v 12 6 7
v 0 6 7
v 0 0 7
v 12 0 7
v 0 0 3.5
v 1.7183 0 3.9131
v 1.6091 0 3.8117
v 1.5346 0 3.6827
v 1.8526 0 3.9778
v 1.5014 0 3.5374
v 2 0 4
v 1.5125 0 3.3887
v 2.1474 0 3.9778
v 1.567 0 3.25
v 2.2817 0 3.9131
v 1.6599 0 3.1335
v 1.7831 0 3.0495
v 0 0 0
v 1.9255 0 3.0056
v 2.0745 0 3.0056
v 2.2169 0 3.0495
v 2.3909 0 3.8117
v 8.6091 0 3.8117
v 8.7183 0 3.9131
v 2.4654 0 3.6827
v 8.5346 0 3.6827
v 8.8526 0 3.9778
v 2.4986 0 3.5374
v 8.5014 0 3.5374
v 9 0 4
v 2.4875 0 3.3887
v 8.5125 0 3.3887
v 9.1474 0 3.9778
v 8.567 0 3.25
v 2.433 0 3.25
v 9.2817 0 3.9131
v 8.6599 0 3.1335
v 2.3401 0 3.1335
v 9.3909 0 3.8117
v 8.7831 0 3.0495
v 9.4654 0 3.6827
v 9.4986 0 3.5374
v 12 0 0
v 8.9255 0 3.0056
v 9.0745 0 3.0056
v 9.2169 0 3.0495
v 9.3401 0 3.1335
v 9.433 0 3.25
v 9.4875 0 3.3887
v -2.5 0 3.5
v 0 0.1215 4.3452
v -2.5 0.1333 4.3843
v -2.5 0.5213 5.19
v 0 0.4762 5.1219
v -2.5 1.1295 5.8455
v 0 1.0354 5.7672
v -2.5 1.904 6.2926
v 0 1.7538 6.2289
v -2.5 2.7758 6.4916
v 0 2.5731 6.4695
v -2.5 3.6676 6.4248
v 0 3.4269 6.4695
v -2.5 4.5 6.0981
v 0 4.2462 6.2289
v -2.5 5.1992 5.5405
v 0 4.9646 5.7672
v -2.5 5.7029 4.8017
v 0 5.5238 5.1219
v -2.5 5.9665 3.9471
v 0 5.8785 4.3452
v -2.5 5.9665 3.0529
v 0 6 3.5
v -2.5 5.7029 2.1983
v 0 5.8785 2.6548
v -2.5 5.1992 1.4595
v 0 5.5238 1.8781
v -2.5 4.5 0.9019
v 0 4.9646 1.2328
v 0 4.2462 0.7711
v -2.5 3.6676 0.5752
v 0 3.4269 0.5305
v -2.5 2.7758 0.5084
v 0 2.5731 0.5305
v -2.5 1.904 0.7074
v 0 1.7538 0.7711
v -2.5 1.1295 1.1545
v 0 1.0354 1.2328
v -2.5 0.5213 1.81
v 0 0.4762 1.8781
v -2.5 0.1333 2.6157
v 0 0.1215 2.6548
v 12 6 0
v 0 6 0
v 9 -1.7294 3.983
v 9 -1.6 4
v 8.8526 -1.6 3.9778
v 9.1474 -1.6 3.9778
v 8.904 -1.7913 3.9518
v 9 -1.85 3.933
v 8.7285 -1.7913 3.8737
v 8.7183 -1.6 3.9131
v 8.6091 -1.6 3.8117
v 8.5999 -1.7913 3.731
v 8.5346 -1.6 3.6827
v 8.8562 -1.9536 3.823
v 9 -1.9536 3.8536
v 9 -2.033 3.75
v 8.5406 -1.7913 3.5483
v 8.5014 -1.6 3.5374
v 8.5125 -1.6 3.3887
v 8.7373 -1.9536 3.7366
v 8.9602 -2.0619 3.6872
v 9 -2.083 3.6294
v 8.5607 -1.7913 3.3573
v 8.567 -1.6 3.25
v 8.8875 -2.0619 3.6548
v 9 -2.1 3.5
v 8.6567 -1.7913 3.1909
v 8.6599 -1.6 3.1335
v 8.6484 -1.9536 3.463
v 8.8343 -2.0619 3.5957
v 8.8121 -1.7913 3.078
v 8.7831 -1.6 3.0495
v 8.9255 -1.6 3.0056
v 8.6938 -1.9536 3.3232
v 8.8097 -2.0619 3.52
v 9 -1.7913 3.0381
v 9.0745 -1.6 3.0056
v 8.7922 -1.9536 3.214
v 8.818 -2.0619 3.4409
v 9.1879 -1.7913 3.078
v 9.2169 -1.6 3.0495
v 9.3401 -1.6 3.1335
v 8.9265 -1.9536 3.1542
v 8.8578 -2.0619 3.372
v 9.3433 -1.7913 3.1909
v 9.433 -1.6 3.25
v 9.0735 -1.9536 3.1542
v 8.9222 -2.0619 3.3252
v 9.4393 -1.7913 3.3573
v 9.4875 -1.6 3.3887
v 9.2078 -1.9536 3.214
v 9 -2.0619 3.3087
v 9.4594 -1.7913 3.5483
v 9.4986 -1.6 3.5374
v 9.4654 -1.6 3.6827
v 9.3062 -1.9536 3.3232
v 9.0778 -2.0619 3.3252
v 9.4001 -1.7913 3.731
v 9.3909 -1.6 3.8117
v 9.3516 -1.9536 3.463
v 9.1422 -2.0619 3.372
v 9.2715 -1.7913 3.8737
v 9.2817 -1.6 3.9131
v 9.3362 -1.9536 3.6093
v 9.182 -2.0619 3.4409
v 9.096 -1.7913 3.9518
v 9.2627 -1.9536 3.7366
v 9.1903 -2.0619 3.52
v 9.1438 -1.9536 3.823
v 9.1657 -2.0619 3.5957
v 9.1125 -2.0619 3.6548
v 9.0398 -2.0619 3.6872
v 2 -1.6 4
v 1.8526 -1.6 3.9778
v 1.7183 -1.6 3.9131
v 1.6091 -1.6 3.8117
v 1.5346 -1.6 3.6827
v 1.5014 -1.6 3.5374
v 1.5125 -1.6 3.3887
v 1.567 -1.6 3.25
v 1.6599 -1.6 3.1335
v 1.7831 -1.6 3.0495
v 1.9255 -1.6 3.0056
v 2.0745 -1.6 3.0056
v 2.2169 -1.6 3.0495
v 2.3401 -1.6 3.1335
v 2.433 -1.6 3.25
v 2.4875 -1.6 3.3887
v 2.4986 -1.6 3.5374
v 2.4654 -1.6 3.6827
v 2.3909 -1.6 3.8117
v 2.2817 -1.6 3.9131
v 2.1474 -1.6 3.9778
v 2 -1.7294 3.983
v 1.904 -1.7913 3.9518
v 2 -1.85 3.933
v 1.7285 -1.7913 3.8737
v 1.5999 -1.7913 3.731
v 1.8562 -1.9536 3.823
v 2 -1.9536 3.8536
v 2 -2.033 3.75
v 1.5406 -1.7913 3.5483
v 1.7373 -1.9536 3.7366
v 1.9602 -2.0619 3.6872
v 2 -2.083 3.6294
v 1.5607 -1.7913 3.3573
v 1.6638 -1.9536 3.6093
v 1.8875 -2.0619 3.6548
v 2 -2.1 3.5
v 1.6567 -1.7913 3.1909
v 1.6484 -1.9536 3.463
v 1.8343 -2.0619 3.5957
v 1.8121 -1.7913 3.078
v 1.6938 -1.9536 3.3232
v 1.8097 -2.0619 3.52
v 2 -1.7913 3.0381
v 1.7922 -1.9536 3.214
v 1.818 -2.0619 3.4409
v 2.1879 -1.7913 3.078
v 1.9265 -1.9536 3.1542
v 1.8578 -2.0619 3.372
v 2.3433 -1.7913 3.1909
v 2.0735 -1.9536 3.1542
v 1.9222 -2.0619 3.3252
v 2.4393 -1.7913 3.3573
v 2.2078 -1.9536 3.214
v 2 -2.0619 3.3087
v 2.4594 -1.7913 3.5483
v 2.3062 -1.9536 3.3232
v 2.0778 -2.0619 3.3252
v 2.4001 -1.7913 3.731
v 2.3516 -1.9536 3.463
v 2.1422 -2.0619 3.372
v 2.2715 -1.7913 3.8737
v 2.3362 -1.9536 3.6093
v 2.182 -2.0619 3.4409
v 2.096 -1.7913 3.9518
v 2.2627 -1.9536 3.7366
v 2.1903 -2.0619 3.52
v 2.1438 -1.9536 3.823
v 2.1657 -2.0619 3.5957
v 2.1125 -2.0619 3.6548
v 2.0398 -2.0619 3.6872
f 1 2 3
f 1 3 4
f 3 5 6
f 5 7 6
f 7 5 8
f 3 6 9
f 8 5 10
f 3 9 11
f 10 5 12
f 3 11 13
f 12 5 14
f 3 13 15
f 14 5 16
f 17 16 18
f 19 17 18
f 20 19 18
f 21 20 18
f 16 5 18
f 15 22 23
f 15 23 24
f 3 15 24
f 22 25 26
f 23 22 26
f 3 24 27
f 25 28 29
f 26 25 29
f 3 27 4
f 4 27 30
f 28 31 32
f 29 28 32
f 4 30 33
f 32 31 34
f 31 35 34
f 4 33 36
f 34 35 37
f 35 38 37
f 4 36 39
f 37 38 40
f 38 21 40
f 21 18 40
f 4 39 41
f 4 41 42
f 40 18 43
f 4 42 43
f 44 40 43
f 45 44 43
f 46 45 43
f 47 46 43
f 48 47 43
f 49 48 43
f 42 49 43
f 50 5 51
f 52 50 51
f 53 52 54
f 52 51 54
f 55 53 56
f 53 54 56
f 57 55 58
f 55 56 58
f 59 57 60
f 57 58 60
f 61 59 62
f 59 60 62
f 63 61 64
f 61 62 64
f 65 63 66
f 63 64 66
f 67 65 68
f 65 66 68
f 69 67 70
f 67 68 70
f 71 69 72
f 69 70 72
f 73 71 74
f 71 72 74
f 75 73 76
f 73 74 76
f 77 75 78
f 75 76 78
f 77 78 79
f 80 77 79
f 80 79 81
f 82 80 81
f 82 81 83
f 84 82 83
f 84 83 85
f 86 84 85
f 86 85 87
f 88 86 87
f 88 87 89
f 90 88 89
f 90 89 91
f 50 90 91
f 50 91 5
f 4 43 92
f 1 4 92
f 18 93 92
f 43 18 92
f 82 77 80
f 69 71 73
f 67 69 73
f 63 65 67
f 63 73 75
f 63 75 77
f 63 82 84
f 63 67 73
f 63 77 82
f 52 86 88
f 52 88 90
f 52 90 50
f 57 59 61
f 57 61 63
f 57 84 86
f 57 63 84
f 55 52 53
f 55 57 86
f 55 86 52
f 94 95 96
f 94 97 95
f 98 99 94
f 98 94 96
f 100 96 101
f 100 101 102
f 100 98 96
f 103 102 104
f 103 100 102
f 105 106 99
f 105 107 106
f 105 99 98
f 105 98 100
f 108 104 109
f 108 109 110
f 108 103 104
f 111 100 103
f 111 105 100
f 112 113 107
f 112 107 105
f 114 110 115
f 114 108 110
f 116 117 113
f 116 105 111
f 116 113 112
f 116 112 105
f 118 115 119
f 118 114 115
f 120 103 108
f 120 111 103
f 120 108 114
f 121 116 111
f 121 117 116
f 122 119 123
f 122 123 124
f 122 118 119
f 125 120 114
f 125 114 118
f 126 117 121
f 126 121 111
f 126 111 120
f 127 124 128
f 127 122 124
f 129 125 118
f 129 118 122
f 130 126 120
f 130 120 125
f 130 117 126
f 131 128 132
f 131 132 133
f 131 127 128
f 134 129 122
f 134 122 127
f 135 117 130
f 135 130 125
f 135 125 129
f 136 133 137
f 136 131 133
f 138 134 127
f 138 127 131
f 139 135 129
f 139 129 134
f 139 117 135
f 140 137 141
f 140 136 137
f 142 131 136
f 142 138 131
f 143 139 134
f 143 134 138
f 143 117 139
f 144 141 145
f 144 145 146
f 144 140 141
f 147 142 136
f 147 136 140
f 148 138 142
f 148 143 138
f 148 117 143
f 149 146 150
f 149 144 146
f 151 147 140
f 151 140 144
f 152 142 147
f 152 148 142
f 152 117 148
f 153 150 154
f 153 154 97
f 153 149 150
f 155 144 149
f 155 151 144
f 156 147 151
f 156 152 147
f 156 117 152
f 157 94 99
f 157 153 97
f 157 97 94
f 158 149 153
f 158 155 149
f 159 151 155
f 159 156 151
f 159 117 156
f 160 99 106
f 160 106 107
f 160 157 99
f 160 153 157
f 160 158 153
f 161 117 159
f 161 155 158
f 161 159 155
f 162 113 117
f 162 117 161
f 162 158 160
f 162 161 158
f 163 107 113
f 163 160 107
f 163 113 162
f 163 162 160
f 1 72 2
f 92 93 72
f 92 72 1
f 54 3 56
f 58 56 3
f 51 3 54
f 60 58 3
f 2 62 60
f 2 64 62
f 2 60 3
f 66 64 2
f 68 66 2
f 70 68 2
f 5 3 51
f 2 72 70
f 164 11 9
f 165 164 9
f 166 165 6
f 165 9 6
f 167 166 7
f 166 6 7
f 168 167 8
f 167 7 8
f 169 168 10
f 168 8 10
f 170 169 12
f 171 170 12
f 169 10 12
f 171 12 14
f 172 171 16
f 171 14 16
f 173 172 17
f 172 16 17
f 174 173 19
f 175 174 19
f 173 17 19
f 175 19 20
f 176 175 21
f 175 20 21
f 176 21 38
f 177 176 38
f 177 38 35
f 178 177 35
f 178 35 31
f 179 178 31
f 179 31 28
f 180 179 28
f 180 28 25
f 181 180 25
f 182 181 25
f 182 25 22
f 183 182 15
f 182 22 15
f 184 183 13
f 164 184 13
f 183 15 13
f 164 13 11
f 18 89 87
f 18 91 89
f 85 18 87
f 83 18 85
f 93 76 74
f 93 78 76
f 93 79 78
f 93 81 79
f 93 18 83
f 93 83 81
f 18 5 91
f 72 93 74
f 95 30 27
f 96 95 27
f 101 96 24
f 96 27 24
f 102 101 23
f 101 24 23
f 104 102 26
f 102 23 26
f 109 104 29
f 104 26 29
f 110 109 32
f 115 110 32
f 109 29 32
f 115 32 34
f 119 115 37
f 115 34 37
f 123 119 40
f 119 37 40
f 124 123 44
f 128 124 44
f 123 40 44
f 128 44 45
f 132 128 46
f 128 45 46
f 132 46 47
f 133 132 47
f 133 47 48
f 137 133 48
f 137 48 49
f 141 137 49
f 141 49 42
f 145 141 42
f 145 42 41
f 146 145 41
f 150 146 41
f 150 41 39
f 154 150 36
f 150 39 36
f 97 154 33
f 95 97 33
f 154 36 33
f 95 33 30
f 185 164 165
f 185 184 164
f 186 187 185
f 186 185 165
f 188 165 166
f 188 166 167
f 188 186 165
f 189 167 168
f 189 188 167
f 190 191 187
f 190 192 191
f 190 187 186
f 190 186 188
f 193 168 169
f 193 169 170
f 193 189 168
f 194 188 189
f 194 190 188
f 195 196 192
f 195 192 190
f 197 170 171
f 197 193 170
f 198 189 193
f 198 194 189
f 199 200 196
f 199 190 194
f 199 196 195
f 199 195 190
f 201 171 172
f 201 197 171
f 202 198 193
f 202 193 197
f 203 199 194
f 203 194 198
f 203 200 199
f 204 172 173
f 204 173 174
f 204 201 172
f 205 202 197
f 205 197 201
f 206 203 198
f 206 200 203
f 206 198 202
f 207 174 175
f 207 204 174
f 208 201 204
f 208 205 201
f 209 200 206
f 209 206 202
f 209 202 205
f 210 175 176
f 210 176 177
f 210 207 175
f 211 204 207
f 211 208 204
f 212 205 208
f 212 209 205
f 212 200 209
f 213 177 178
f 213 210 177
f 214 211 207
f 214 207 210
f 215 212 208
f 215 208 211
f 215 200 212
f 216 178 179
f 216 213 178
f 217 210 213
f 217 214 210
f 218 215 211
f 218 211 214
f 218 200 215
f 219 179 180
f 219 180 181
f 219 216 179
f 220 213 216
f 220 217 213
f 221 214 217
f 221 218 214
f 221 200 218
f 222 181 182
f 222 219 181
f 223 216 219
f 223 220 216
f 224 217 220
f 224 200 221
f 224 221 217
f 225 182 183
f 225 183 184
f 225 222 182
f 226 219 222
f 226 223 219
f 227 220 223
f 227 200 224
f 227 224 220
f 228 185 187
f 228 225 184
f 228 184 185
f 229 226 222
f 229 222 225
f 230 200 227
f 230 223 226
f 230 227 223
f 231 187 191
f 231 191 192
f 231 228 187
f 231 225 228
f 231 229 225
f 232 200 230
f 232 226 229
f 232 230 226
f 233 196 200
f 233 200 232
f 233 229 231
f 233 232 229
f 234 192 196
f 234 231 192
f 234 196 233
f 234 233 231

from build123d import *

# Parameters (mm, degrees)
SKETCH1_W           = 12
SKETCH1_H           = 6
BOSS_EXTRUDE1_DEPTH = 7
SKETCH2_R           = 3
BOSS_EXTRUDE2_DEPTH = 2.5
SKETCH3_R           = 0.5
BOSS_EXTRUDE3_DEPTH = 2.1
FILLET1_R           = 0.5


with BuildPart() as part:
    # Sketch1 → Boss-Extrude1 (new body)
    with BuildSketch(Plane.XY):
        with Locations((6, 3)):
            Rectangle(SKETCH1_W, SKETCH1_H)
    extrude(amount=BOSS_EXTRUDE1_DEPTH)

    # Sketch2 → Boss-Extrude2 (add)
    with BuildSketch(Plane.ZY):
        with Locations(Location((3.5, 3, 0), (0, 0, 270))):
            Circle(SKETCH2_R)
    extrude(amount=BOSS_EXTRUDE2_DEPTH)

    # Sketch3 → Boss-Extrude3 (add)
    with BuildSketch(Plane.XZ):
        with Locations(Location((2, 3.5, 0), (0, 0, 90))):
            Circle(SKETCH3_R)
        with Locations(Location((9, 3.5, 0), (0, 0, 90))):
            Circle(SKETCH3_R)
    extrude(amount=BOSS_EXTRUDE3_DEPTH)

    # Fillet1
    fillet1_edges = [part.edges().sort_by_distance(p)[0] for p in [
        (2, -2.1, 3),
        (9, -2.1, 3),
    ]]
    fillet(fillet1_edges, radius=FILLET1_R)


solid = part.part
